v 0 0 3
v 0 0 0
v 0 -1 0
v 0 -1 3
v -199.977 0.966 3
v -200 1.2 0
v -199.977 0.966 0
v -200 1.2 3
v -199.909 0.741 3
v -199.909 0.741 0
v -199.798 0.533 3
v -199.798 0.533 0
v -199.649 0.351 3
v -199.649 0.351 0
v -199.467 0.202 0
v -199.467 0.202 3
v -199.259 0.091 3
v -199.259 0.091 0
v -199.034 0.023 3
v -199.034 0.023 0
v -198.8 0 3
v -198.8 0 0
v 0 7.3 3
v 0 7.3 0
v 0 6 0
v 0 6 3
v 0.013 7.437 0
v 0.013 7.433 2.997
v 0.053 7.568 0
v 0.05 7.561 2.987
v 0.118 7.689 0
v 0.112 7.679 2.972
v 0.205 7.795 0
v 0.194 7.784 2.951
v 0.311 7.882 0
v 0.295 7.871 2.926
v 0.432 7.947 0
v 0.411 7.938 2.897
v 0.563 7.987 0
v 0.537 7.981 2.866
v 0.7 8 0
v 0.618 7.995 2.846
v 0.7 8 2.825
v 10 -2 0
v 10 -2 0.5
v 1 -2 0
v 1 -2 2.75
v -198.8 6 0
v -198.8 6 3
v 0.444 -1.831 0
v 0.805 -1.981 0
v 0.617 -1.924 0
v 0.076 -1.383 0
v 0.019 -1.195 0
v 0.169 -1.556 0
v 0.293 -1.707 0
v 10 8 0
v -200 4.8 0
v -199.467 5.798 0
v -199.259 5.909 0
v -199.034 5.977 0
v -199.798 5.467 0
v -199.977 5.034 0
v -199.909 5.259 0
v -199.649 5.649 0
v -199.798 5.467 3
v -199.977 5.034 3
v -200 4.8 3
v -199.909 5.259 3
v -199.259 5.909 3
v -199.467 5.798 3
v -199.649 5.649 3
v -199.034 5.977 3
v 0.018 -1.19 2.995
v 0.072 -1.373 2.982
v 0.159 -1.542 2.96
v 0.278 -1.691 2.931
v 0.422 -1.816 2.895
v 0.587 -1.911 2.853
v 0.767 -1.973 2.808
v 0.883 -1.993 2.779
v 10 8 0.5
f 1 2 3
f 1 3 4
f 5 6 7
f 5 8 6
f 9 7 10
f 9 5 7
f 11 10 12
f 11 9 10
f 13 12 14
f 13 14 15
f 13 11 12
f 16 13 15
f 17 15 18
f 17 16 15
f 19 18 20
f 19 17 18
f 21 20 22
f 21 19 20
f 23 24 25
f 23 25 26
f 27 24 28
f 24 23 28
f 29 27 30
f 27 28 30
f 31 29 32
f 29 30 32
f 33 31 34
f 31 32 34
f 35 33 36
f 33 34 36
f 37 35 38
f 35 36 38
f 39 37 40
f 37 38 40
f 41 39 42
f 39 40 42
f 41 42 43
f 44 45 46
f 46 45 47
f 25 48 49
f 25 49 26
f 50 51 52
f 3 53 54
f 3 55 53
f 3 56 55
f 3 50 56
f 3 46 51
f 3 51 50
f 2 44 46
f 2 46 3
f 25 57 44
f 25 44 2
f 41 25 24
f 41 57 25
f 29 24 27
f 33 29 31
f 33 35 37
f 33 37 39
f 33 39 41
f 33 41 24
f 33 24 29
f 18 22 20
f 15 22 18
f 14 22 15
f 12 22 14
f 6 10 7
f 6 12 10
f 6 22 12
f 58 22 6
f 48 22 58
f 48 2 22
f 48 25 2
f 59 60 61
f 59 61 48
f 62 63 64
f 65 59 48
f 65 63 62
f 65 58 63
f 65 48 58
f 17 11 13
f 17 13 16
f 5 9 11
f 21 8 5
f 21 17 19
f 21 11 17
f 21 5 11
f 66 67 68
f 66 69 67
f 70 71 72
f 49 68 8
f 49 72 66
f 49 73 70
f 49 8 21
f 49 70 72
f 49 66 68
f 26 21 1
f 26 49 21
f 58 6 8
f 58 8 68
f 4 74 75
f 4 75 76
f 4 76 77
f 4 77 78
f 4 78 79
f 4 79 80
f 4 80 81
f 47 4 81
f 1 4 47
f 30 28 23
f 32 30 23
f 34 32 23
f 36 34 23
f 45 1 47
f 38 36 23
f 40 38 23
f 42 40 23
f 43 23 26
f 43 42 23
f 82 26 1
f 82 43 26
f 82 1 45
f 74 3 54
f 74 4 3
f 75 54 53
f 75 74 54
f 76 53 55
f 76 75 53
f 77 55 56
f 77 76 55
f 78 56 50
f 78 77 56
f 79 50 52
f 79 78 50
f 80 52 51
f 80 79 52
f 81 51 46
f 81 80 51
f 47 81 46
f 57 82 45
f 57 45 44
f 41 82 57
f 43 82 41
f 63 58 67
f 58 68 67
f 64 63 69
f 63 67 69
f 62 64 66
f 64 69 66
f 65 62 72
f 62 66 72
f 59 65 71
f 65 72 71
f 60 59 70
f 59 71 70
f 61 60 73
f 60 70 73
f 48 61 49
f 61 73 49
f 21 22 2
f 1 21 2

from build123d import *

# Parameters (mm, degrees)
PAD_DEPTH     = 10
FILLET001_1_R = 1
FILLET001_2_R = 0.7
BOX_W         = 200
BOX_H         = 6
BOX_DEPTH     = 3
FILLET_R      = 1.2


with BuildPart() as end_fillet:
    # Sketch → Pad (new body)
    with BuildSketch(Plane.XZ):
        Polygon((0, 0), (0, 3), (10, 0.5), (10, 0), align=None)
    extrude(amount=PAD_DEPTH)


with BuildPart() as end_fillet_1:
    # Body placement: moved
    add(end_fillet.part.moved(Location((0, 8, 0))))

    # Fillet001 1
    fillet001_1_edges = [end_fillet_1.edges().sort_by_distance(p)[0] for p in [
        (0, -2, 1.5),
    ]]
    fillet(fillet001_1_edges, radius=FILLET001_1_R)

    # Fillet001 2
    fillet001_2_edges = [end_fillet_1.edges().sort_by_distance(p)[0] for p in [
        (0, 8, 1.5),
    ]]
    fillet(fillet001_2_edges, radius=FILLET001_2_R)


with BuildPart() as fusion:
    # Box → Box (new body)
    with BuildSketch(Plane(origin=(-200, 0, 0), x_dir=(1, 0, 0), z_dir=(0, 0, 1))):
        with Locations((100, 3)):
            Rectangle(BOX_W, BOX_H)
    extrude(amount=BOX_DEPTH)

    # Fillet
    fillet_edges = [fusion.edges().sort_by_distance(p)[0] for p in [
        (-200, 0, 1.5),
        (-200, 6, 1.5),
    ]]
    fillet(fillet_edges, radius=FILLET_R)

    # Fusion: union end fillet
    add(end_fillet_1.part)


solid = fusion.part
